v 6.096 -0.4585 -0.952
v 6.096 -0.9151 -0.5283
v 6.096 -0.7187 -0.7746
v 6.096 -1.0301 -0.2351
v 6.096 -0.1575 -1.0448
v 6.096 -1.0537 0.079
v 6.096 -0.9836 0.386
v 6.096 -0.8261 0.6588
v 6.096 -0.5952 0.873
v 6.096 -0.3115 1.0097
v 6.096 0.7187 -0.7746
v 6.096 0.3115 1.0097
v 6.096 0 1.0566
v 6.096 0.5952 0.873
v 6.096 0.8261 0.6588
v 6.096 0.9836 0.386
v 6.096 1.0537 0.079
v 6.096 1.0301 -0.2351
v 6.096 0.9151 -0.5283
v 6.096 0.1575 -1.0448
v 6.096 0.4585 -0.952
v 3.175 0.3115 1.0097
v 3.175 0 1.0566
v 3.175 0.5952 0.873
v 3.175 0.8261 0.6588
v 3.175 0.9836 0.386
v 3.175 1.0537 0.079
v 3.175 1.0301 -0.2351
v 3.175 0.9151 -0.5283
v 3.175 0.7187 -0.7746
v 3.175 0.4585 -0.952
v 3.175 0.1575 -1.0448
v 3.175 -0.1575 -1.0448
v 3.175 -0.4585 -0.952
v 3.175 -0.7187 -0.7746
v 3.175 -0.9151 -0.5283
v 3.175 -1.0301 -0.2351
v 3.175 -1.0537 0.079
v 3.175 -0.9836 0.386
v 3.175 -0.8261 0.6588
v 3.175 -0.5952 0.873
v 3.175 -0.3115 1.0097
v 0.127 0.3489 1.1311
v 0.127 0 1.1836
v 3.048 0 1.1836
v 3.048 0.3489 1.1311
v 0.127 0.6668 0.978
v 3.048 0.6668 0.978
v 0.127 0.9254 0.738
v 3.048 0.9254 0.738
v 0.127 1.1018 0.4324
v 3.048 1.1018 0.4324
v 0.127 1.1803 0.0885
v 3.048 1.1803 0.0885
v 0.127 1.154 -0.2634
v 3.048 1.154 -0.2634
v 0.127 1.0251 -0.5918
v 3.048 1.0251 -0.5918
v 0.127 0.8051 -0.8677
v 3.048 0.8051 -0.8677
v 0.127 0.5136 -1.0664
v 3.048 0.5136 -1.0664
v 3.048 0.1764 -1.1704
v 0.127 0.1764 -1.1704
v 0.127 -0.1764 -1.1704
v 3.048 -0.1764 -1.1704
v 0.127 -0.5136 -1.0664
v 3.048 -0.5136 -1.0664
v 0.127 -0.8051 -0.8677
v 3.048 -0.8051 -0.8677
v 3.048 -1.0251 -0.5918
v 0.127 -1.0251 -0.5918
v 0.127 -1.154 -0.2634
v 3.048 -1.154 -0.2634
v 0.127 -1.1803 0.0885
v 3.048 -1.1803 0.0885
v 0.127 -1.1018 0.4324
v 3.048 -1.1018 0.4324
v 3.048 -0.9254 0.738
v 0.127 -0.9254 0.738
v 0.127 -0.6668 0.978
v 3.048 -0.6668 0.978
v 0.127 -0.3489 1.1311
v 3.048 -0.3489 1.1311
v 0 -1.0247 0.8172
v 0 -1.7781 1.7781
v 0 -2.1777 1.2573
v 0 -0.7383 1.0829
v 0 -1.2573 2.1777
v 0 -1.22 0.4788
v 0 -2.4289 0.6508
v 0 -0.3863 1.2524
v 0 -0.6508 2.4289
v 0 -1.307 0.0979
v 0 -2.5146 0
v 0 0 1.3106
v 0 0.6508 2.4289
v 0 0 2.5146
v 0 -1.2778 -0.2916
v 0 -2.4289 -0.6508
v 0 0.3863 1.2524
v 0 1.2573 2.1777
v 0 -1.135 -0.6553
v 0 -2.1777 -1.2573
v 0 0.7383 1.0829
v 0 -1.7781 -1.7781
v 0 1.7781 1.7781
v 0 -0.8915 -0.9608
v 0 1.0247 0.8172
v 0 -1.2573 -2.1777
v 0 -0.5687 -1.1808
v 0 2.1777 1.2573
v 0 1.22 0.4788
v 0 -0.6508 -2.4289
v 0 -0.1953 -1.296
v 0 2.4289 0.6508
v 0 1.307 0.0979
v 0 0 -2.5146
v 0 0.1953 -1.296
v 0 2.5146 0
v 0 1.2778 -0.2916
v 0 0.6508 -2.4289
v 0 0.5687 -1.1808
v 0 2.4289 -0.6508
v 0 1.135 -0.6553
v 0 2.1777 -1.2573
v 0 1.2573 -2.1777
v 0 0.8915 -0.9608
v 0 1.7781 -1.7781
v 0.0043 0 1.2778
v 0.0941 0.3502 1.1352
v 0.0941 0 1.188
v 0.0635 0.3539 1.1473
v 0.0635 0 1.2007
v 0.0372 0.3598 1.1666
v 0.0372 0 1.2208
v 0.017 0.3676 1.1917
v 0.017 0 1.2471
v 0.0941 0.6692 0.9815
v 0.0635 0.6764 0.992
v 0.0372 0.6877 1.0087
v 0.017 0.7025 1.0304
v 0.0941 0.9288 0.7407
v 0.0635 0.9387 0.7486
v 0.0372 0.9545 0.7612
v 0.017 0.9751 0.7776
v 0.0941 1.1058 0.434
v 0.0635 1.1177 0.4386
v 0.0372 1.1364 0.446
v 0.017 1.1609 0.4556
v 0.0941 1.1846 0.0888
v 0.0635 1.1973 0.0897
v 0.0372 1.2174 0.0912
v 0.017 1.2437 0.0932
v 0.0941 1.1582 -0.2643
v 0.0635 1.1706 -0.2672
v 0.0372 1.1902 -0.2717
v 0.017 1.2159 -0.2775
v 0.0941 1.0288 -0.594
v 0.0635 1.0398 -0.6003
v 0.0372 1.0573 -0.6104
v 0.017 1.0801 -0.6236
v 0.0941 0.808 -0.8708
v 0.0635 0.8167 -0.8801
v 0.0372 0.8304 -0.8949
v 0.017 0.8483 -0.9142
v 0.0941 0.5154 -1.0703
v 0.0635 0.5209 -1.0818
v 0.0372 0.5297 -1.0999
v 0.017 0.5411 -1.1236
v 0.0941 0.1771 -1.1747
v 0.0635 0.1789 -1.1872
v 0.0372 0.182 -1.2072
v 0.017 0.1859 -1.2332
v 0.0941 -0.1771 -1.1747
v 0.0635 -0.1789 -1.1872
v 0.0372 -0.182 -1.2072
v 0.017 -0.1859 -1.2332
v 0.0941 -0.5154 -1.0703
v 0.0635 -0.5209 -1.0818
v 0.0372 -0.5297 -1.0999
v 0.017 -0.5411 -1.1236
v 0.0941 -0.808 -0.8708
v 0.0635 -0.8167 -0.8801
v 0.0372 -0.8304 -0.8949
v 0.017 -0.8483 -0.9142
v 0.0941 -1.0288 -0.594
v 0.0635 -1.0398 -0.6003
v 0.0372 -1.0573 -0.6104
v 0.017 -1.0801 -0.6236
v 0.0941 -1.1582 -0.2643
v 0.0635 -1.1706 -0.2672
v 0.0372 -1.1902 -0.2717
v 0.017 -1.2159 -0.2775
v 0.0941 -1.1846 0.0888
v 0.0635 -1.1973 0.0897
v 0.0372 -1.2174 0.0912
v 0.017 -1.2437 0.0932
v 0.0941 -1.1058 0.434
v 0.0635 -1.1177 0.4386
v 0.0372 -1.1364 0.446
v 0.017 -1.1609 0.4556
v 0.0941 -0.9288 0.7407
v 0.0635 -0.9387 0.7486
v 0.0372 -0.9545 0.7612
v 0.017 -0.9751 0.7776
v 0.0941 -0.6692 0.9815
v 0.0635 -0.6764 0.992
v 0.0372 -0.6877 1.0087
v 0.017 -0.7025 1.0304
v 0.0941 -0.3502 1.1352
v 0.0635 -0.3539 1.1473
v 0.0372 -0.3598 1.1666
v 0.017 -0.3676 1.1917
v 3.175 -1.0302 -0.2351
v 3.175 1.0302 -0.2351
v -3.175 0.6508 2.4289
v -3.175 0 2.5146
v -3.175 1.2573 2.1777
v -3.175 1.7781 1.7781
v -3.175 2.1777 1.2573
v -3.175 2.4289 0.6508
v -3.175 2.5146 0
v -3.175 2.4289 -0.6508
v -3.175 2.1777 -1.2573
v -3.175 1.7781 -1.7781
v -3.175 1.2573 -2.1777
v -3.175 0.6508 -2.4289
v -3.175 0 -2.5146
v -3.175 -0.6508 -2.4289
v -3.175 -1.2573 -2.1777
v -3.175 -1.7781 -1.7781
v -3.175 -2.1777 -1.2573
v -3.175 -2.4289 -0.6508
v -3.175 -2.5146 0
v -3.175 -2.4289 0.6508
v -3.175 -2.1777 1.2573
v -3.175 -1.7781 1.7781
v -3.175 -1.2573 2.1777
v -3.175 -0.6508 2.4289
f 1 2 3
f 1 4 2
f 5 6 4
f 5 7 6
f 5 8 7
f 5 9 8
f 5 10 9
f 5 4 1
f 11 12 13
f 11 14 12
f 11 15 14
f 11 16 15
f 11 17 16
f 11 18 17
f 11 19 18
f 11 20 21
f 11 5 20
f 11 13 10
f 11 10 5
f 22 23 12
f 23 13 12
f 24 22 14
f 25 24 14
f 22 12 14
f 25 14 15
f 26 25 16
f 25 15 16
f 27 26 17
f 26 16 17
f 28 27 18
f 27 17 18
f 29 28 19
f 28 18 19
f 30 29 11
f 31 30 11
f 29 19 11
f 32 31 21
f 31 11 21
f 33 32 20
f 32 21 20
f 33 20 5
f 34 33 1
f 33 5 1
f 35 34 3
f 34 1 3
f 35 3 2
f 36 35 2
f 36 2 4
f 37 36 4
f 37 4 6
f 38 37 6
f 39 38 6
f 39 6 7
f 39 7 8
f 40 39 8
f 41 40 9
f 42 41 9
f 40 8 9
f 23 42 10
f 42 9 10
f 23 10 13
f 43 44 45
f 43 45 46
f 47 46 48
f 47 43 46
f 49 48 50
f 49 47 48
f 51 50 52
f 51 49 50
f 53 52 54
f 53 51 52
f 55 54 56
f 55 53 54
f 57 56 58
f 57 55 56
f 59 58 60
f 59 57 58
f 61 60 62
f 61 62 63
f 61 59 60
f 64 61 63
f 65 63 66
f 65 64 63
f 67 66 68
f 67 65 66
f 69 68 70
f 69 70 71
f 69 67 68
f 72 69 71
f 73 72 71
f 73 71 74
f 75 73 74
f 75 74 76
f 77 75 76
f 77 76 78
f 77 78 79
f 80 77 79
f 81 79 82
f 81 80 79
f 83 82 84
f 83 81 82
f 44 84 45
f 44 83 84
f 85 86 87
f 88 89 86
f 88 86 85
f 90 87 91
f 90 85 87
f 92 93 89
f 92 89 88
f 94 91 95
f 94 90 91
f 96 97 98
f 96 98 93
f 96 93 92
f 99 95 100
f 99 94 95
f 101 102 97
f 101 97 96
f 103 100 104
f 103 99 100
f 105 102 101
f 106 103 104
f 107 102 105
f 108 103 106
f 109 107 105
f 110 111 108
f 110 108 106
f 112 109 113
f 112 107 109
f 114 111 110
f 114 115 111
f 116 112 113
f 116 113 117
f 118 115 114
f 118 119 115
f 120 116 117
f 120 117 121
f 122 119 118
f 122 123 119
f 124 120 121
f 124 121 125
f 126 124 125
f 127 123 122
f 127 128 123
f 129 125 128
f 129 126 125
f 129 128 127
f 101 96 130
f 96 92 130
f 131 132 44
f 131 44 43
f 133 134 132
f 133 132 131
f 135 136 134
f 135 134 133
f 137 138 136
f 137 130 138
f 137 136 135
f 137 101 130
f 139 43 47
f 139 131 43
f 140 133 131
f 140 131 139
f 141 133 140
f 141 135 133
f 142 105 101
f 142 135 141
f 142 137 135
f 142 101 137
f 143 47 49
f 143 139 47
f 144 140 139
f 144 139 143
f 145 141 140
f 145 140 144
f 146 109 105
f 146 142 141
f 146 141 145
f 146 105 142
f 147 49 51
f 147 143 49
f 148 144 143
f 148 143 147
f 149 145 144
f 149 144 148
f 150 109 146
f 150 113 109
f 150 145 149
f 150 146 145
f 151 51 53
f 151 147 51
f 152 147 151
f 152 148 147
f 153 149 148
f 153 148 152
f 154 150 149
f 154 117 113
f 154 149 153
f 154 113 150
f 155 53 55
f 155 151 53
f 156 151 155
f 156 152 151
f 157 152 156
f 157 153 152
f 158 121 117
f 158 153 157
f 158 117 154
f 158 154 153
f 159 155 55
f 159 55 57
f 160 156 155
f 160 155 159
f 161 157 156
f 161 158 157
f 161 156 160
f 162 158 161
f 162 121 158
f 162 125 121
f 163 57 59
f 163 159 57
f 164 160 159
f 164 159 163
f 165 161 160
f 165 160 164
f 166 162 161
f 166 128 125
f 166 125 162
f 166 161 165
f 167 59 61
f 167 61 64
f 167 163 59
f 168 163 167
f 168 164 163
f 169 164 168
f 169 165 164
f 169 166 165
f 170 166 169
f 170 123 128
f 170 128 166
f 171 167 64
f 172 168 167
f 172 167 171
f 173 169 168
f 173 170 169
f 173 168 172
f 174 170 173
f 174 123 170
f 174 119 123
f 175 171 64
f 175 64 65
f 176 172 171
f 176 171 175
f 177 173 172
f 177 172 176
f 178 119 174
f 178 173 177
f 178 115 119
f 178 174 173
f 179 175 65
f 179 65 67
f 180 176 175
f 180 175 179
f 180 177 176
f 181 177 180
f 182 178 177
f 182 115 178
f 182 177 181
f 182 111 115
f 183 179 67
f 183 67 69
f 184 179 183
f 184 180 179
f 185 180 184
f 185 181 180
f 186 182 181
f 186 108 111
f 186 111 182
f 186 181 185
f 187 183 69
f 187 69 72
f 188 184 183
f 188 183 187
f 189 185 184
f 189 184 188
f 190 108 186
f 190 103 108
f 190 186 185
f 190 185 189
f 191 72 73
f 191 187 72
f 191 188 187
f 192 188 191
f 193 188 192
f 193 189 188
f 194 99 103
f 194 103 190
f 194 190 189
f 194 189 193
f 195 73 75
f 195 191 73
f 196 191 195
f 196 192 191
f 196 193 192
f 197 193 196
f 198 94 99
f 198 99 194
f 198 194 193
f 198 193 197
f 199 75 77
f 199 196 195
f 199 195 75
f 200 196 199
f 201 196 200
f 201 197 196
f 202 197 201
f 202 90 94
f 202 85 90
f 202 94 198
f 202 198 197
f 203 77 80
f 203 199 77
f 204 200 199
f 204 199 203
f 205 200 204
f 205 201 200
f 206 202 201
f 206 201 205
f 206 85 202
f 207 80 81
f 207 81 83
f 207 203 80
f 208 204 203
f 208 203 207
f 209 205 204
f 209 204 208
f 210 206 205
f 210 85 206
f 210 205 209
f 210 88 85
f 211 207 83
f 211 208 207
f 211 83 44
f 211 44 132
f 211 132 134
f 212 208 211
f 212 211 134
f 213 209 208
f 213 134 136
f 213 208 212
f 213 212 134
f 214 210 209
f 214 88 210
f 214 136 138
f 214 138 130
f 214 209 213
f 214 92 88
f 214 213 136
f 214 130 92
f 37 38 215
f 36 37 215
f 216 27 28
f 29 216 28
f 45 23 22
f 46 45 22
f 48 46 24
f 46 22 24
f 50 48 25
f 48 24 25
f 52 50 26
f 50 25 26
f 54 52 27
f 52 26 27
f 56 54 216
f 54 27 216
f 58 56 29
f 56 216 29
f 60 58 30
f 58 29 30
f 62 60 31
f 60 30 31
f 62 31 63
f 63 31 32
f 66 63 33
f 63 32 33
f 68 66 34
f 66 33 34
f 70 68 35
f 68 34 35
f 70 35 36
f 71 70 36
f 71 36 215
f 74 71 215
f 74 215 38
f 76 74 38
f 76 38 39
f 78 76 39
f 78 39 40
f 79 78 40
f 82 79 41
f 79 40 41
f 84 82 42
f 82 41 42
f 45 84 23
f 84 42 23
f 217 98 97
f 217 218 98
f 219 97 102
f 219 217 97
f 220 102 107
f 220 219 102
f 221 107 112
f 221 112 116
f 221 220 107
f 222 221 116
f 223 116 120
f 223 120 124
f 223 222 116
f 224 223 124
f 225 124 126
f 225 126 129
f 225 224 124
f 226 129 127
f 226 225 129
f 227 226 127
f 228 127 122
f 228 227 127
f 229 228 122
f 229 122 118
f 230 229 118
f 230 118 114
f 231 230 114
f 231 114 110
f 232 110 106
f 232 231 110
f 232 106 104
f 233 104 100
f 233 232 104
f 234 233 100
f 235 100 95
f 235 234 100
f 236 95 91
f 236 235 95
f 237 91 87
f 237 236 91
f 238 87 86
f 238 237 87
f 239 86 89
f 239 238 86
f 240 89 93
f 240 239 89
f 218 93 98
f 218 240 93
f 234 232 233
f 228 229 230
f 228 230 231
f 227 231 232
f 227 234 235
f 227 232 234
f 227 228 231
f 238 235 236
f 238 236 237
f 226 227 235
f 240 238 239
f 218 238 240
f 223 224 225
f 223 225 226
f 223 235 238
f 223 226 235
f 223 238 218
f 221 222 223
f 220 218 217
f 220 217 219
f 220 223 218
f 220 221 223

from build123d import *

# Parameters (mm, degrees)
F0_W     = 2.921
F0_H     = 1.05664
F2_R     = 0.127
F3_SIZE2 = 0.12699
F3_SIZE  = 0.12699


# Not quite as in the source:
# - a fillet or chamfer is up to 0.001 mm smaller than in the source, because OpenCascade refuses the exact size


with BuildPart() as f1:
    # F0 (on Front) → F1 (revolve)
    with BuildSketch(Plane.XZ):
        Polygon((-3.175, 0), (0, 0), (0, 1.18364), (0, 2.5146), (-3.175, 2.5146), align=None)
        Polygon((0, 1.18364), (0, 0), (3.175, 0), (3.175, 1.05664), (3.175, 1.18364), align=None)
        with Locations((4.6355, 0.52832)):
            Rectangle(F0_W, F0_H)
    revolve(axis=Axis((-1.5875, 0, 0), (-1, 0, 0)))

    # F2
    f2_edges = [f1.edges().sort_by_distance(p)[0] for p in [
        (0, 0, -1.18364),
    ]]
    fillet(f2_edges, radius=F2_R)

    # F3 (size 0.127 and 0.127 in the source; OpenCascade refuses exactly that, so slightly less here)
    f3_edges = [f1.edges().sort_by_distance(p)[0] for p in [
        (3.175, 0, -1.18364),
    ]]
    chamfer(f3_edges, length=F3_SIZE, length2=F3_SIZE2)


solid = f1.part
